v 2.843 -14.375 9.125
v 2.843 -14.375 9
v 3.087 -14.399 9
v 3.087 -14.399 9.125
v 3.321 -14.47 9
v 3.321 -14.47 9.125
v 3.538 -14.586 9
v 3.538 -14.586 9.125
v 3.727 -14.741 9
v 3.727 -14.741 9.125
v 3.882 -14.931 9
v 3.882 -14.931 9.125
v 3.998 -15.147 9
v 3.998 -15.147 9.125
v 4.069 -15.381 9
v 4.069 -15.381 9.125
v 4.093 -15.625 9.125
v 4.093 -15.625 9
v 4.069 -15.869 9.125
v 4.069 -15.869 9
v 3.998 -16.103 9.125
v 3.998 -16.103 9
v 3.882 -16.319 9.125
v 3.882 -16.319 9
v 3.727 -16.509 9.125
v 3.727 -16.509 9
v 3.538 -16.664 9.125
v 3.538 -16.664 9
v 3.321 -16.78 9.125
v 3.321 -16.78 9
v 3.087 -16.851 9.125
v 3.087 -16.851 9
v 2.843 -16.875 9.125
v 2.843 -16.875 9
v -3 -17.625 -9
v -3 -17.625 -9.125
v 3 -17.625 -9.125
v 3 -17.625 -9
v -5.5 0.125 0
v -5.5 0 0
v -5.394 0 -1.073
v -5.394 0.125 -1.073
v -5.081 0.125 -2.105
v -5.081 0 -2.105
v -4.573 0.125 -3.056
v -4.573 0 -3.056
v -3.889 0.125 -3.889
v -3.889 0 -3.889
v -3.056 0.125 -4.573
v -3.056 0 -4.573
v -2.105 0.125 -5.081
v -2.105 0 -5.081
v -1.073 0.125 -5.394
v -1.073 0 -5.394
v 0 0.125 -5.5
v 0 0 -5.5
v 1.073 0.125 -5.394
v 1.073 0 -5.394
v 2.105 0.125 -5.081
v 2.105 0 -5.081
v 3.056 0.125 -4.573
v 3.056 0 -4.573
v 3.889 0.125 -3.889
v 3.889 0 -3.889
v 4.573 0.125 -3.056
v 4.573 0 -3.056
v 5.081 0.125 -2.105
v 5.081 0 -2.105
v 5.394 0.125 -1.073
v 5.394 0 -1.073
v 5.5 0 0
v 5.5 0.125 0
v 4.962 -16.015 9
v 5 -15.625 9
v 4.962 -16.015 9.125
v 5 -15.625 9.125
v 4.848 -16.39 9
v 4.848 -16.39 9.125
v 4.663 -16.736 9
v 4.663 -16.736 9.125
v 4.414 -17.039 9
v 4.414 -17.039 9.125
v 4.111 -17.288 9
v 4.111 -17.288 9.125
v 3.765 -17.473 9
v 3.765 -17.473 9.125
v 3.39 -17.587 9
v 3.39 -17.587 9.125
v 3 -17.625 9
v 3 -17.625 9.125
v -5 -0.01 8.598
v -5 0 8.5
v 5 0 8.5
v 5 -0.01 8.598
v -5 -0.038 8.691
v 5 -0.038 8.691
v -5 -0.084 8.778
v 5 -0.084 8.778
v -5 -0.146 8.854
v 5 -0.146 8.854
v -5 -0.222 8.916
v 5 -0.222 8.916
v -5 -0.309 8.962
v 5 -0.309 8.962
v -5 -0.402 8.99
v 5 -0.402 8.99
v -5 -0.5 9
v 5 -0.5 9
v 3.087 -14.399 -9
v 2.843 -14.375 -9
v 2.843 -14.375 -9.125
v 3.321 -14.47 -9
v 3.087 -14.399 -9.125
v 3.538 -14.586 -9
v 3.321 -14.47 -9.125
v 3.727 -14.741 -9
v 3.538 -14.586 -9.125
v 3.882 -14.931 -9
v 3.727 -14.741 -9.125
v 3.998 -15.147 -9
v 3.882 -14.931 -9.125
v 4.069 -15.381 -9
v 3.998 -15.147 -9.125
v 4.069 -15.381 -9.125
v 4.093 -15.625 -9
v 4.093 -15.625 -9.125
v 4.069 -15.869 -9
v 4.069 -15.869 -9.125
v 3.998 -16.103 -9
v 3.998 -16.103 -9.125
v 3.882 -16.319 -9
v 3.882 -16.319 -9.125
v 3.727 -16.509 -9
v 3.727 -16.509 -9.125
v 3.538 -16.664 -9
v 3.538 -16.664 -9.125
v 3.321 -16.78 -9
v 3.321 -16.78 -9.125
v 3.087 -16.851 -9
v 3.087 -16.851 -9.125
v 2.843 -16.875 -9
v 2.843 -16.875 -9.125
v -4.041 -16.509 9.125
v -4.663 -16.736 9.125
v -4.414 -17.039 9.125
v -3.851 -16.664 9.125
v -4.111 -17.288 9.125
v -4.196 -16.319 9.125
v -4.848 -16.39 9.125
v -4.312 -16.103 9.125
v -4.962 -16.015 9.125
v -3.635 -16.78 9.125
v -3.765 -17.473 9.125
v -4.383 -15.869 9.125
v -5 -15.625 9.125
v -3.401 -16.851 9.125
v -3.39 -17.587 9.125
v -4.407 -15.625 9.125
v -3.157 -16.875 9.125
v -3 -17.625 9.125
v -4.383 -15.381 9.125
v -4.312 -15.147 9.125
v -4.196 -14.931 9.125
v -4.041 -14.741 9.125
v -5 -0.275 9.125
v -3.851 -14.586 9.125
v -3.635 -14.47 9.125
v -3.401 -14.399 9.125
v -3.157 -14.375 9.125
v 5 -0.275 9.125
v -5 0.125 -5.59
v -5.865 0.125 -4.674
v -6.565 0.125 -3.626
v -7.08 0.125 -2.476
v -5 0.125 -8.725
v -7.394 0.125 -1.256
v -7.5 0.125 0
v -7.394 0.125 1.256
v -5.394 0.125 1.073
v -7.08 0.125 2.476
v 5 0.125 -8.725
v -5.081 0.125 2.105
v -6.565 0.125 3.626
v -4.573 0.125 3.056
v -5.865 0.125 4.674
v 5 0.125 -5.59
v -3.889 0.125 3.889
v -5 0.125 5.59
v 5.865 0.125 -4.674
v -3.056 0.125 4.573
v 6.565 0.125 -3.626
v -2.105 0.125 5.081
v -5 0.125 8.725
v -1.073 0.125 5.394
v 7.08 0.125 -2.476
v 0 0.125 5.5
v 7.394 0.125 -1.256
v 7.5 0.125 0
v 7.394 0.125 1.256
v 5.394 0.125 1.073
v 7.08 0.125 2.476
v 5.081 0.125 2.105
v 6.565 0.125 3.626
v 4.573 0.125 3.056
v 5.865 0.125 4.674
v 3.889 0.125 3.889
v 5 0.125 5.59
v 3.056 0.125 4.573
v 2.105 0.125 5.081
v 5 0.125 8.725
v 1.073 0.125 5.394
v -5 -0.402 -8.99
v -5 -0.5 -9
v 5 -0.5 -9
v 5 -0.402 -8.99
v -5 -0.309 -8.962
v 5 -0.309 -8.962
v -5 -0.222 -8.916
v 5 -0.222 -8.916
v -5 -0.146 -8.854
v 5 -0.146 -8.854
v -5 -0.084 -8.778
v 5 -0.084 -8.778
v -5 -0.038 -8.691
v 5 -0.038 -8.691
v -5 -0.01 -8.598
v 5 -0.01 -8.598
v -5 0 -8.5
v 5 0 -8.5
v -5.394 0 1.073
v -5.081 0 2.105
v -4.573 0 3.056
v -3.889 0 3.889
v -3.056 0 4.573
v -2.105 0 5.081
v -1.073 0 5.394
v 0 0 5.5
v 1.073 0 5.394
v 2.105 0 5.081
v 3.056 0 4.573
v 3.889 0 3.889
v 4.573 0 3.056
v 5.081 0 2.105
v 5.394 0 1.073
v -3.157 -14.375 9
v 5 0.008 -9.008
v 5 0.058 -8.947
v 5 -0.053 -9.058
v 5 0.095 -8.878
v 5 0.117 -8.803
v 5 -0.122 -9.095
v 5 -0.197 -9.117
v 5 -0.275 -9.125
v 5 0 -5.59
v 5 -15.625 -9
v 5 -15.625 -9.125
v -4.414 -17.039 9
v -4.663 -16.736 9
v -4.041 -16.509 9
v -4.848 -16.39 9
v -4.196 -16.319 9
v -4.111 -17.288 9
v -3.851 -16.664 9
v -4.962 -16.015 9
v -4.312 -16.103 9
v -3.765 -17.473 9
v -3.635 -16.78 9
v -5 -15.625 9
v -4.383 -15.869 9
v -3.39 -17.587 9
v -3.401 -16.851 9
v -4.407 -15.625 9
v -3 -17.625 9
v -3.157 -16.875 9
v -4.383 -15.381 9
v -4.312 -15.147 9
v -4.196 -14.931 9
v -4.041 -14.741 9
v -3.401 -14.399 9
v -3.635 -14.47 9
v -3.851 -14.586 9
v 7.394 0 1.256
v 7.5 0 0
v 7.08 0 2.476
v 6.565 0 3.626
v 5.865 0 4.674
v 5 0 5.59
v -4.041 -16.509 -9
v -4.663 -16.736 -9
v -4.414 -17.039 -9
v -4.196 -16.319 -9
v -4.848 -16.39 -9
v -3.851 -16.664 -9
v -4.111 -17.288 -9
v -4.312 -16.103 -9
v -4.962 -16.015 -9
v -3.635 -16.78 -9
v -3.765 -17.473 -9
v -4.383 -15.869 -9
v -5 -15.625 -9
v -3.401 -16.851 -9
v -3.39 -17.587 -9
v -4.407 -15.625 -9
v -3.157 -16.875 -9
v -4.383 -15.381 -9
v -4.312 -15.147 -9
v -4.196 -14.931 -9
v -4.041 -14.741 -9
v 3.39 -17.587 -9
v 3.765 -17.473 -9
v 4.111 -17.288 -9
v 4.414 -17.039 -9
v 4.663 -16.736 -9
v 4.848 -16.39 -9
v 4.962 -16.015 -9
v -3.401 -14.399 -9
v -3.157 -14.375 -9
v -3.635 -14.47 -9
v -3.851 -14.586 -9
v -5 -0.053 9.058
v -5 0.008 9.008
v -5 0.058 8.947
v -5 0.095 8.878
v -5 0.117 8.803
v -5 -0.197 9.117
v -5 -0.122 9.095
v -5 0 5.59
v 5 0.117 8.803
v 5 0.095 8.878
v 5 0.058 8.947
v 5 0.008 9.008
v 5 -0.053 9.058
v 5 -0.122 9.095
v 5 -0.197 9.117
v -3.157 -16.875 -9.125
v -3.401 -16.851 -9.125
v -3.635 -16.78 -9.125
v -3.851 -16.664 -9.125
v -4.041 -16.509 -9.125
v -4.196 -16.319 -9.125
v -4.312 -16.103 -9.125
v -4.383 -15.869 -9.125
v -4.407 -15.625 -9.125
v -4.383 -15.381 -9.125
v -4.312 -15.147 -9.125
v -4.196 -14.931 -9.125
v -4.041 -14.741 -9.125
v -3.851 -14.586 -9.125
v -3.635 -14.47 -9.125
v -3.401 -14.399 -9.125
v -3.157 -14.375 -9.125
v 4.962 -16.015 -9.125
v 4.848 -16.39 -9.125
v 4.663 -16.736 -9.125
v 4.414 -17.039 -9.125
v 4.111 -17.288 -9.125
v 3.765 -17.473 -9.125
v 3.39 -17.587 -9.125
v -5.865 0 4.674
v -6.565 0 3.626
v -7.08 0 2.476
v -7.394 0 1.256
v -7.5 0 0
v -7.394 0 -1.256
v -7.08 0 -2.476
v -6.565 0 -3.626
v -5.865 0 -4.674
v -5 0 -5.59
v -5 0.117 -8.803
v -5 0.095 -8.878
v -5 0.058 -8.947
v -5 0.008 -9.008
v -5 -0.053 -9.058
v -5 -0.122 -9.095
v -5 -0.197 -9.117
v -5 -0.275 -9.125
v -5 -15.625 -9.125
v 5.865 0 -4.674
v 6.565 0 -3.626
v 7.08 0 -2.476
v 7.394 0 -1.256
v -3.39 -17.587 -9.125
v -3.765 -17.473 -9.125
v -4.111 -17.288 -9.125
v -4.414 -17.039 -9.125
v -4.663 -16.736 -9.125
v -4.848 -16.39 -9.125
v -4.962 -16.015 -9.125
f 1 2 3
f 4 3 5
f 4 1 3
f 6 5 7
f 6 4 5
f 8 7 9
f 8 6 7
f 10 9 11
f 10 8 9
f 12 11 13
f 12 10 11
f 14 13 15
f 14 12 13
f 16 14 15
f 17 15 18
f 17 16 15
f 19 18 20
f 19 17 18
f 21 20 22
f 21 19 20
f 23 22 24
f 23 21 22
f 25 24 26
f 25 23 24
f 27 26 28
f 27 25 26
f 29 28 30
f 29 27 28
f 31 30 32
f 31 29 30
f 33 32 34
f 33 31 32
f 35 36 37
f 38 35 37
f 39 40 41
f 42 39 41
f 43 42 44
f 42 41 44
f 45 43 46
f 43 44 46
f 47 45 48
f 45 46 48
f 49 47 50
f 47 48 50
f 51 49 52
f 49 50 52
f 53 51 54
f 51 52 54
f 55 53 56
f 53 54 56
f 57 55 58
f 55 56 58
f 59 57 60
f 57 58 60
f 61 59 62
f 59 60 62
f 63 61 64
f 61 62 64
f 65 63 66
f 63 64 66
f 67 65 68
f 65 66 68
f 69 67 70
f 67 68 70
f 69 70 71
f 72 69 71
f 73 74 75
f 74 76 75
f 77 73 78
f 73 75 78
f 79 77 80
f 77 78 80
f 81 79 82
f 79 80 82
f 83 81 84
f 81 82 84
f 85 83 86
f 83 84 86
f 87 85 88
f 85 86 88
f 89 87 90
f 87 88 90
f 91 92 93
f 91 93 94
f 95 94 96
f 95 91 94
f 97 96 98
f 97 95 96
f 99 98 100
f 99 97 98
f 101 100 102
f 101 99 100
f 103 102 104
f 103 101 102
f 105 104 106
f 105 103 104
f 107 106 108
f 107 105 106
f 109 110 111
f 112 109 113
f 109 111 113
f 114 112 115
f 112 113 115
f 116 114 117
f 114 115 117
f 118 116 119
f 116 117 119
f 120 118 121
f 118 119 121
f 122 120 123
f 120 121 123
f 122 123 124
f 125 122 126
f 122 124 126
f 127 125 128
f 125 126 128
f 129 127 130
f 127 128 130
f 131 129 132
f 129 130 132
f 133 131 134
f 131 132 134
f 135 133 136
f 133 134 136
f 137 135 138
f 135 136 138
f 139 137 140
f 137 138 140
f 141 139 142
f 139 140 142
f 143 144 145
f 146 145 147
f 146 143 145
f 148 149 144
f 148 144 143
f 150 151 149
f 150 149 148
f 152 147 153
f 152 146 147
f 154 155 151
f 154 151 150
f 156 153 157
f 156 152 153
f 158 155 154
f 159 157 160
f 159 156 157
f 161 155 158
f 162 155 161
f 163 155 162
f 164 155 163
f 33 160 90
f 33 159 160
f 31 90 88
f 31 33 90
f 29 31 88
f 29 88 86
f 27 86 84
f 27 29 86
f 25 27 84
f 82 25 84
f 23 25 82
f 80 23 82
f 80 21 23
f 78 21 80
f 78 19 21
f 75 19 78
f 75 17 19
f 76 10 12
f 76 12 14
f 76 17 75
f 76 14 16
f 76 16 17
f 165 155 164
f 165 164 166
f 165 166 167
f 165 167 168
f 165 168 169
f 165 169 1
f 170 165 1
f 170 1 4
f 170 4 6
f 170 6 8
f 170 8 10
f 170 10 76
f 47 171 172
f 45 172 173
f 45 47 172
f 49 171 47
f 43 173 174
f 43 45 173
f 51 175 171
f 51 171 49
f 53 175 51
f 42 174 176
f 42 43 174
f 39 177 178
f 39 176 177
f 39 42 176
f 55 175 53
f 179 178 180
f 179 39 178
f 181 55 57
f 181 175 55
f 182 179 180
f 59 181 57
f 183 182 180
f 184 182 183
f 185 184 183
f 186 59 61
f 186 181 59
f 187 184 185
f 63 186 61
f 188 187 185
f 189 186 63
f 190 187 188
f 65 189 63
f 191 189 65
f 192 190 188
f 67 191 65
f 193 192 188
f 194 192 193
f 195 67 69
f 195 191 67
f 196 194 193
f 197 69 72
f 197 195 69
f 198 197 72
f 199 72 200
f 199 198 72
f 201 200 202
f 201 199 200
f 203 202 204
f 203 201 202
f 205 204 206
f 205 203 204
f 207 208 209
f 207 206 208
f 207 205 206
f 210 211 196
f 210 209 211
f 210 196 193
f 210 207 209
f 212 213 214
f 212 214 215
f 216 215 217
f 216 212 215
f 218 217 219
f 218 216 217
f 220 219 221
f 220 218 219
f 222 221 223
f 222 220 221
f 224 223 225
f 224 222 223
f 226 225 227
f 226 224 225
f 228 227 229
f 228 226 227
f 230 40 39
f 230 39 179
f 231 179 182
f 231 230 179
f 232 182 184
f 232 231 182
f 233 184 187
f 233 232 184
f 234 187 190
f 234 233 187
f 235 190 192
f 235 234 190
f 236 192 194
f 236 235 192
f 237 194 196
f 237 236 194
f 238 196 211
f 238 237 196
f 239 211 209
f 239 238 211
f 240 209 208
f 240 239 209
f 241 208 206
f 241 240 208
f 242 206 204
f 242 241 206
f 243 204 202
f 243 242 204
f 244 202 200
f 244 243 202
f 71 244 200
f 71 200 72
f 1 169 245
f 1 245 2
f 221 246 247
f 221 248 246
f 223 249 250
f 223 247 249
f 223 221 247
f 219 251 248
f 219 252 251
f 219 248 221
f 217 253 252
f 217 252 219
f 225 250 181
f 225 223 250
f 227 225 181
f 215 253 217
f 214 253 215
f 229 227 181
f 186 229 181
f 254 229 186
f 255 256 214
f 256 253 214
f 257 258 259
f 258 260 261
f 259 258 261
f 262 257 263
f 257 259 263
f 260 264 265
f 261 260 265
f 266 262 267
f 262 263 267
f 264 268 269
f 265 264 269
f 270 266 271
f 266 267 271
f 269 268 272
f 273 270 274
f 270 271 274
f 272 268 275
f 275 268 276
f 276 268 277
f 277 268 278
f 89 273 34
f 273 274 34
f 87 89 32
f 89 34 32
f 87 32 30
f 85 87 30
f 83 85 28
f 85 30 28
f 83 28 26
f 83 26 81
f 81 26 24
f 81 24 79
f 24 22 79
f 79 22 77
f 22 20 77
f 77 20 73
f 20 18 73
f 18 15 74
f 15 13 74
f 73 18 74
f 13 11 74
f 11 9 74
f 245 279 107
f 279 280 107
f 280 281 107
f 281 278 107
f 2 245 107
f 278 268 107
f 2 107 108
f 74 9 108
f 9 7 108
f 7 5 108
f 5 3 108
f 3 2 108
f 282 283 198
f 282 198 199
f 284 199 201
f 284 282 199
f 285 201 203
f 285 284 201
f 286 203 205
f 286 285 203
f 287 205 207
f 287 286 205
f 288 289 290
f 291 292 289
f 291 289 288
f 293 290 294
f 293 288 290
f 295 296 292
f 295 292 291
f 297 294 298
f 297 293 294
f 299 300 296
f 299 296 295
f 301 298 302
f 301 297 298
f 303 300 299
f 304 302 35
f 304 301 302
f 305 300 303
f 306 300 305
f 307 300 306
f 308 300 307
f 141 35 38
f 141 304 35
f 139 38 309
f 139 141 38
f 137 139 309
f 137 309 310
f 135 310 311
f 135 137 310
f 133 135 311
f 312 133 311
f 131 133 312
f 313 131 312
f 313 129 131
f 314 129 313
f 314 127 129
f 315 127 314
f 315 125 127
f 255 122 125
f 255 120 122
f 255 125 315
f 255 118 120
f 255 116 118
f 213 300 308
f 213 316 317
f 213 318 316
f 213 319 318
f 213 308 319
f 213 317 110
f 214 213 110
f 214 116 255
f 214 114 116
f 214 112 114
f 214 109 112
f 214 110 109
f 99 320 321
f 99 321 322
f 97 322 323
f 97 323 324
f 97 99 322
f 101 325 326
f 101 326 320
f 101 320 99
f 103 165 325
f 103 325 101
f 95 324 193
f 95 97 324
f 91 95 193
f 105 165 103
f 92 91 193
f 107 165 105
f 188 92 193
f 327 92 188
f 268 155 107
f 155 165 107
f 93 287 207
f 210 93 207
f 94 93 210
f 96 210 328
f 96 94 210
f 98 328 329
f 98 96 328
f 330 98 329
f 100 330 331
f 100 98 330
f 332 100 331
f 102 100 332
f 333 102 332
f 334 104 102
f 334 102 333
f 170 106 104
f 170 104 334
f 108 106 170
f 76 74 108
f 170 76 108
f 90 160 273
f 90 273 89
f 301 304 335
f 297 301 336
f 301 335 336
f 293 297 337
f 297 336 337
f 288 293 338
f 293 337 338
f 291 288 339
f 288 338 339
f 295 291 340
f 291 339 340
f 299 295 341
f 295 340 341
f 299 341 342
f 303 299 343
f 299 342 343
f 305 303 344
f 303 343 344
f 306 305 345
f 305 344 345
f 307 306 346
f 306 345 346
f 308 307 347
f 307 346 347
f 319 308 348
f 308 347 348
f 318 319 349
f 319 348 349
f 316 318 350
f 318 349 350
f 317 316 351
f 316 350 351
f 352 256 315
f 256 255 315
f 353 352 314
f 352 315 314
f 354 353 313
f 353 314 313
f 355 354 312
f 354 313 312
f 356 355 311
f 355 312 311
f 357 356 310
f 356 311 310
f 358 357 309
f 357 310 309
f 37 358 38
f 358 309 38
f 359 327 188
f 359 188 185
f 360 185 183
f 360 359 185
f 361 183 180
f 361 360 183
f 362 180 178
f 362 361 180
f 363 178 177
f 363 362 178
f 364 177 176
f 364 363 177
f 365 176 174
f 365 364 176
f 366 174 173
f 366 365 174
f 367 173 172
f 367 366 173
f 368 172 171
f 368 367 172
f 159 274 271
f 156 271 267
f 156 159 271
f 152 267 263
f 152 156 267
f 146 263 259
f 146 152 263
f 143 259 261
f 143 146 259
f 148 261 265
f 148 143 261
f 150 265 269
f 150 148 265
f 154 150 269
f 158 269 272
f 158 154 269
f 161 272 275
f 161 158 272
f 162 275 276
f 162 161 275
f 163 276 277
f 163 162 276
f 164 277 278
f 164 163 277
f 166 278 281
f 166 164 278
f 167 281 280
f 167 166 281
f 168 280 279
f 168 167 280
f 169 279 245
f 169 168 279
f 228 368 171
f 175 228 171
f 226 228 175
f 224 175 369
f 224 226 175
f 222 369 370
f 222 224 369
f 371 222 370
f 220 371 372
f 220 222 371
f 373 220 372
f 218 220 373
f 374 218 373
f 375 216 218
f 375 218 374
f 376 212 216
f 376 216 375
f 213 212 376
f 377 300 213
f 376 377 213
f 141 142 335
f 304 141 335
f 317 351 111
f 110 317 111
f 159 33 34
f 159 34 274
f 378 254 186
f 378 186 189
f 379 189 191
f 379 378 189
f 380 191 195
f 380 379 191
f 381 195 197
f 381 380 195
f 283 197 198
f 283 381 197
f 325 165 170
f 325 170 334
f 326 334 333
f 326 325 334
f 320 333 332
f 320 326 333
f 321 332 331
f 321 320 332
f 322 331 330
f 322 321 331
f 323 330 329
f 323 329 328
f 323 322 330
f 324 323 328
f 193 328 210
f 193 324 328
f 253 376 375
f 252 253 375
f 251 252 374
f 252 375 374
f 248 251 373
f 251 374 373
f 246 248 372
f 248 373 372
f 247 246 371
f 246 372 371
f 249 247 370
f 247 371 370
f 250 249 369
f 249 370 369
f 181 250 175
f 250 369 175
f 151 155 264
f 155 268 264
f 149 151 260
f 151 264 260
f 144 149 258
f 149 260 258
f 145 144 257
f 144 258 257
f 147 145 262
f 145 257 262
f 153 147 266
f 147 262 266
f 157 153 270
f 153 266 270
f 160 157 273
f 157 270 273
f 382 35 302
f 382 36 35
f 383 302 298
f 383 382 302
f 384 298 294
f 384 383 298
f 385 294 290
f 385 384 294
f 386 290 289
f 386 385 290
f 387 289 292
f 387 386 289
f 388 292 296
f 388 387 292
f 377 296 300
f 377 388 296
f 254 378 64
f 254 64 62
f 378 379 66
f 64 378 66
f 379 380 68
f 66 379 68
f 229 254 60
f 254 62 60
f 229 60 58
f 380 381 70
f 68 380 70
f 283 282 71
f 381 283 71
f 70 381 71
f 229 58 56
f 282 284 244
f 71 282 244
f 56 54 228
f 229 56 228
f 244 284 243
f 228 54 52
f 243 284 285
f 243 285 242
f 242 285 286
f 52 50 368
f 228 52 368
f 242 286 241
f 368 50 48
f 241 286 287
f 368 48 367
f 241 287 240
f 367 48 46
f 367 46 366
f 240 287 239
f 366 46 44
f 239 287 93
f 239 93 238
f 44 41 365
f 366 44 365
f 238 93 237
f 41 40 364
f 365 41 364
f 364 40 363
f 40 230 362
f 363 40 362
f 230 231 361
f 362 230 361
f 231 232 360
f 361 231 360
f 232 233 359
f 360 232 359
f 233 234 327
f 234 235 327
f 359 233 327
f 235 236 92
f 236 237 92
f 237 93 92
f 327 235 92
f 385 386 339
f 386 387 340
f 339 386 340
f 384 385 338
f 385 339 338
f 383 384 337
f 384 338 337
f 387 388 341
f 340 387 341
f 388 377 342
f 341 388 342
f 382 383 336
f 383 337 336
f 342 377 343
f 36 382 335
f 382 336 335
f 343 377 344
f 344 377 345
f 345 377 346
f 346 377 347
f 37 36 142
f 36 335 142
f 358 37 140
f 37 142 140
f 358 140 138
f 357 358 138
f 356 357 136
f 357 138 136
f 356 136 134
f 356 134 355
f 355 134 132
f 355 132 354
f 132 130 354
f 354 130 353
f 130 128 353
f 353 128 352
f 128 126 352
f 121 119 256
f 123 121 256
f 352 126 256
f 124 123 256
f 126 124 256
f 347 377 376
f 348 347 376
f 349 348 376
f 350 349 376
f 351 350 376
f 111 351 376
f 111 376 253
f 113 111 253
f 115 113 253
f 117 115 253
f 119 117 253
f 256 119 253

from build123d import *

# Parameters (mm, degrees)
BOSS_EXTRUDE1_DEPTH = 0.125
SKETCH3_W           = 0.125
SKETCH3_H           = 15.25
BOSS_EXTRUDE2_DEPTH = 15.766908
SKETCH4_W           = 15.766907998
SKETCH4_H           = 0.125
BOSS_EXTRUDE3_DEPTH = 2.5
CUT_EXTRUDE1_DEPTH  = 2.5
FILLET1_R           = 0.4
FILLET2_R           = 0.5
FILLET3_R           = 0.5
FILLET4_R           = 2
FILLET5_R           = 2
FILLET6_R           = 0.4
CUT_EXTRUDE2_START  = -17.75
CUT_EXTRUDE2_DEPTH  = 17.75
FILLET7_R           = 2


with BuildPart() as part:
    # Sketch2 → Boss-Extrude1 (new body)
    with BuildSketch(Plane(origin=(0, 0, 0), x_dir=(1, 0, 0), z_dir=(0, 1, 0))):
        with BuildLine():
            Line((-7.883453999, 0), (-5.5, 0))
            ThreePointArc((-5.5, 0), (0, -5.5), (5.5, 0))
            Line((5.5, 0), (7.883453999, 0))
            Line((7.883453999, 0), (7.883453999, -9))
            Line((7.883453999, -9), (-7.883453999, -9))
            Line((-7.883453999, -9), (-7.883453999, 0))
        make_face()
    extrude(amount=BOSS_EXTRUDE1_DEPTH)

    # Sketch3 → Boss-Extrude2 (add)
    with BuildSketch(Plane(origin=(7.883453999, 0, 0), x_dir=(0, 0, -1), z_dir=(1, 0, 0))):
        with Locations((-9.0625, -7.5)):
            Rectangle(SKETCH3_W, SKETCH3_H)
    extrude(amount=-BOSS_EXTRUDE2_DEPTH)

    # Sketch4 → Boss-Extrude3 (add)
    with BuildSketch(Plane.XZ.offset(15.125)):
        with Locations((0, 9.0625)):
            Rectangle(SKETCH4_W, SKETCH4_H)
    extrude(amount=BOSS_EXTRUDE3_DEPTH)

    # Sketch5 → Cut-Extrude1 (cut)
    with BuildSketch(Plane.XY.offset(9.125)):
        with BuildLine():
            Line((-3.156922186, -14.375), (2.843077814, -14.375))
            ThreePointArc((2.843077814, -14.375), (4.093077814, -15.625), (2.843077814, -16.875))
            Line((2.843077814, -16.875), (-3.156922186, -16.875))
            ThreePointArc((-3.156922186, -16.875), (-4.406922186, -15.625), (-3.156922186, -14.375))
        make_face()
    extrude(amount=-CUT_EXTRUDE1_DEPTH, mode=Mode.SUBTRACT)

    # Mirror1: part across plane


with BuildPart() as part_1:
    add(part.part)
    add(part.part.mirror(Plane(origin=(5.5, 0.125, 0), x_dir=(1, 0, 0), z_dir=(0, 0, 1))))

    # Fillet1
    fillet1_edges = [part_1.edges().sort_by_distance(p)[0] for p in [
        (-1e-09, 0.125, 9.125),
    ]]
    fillet(fillet1_edges, radius=FILLET1_R)

    # Fillet2
    fillet2_edges = [part_1.edges().sort_by_distance(p)[0] for p in [
        (0, 0, 9),
    ]]
    fillet(fillet2_edges, radius=FILLET2_R)

    # Fillet3
    fillet3_edges = [part_1.edges().sort_by_distance(p)[0] for p in [
        (0, 0, -9),
    ]]
    fillet(fillet3_edges, radius=FILLET3_R)

    # Fillet4
    fillet4_edges = [part_1.edges().sort_by_distance(p)[0] for p in [
        (7.883453999, -17.625, 9.0625),
        (-7.883453999, -17.625, 9.0625),
    ]]
    fillet(fillet4_edges, radius=FILLET4_R)

    # Fillet5
    fillet5_edges = [part_1.edges().sort_by_distance(p)[0] for p in [
        (7.883453999, -17.625, -9.0625),
        (-7.883453999, -17.625, -9.0625),
    ]]
    fillet(fillet5_edges, radius=FILLET5_R)

    # Fillet6
    fillet6_edges = [part_1.edges().sort_by_distance(p)[0] for p in [
        (-1e-09, 0.125, -9.125),
    ]]
    fillet(fillet6_edges, radius=FILLET6_R)

    # Sketch6 → Cut-Extrude2 (cut)
    with BuildSketch(Plane(origin=(0, 0.125, 0), x_dir=(1, 0, 0), z_dir=(0, 1, 0)).offset(CUT_EXTRUDE2_START)):
        Polygon((7.883453999, -8.725), (5, -8.725), (5, -13.174899539), (11.0971106, -13.174899539), (11.0971106, 15.116605335), (5, 15.116605335), (5, 8.725), (7.883453999, 8.725), align=None)
        Polygon((-5, -13.174899539), (-5, -8.725), (-7.883453999, -8.725), (-7.883453999, 8.725), (-5, 8.725), (-5, 15.116605335), (-11.0971106, 15.116605335), (-11.0971106, -13.174899539), align=None)
        with BuildLine():
            Line((5, -5.590169944), (5, -8.725))
            Line((5, -8.725), (7.883453999, -8.725))
            Line((7.883453999, -8.725), (7.883453999, 8.725))
            Line((7.883453999, 8.725), (5, 8.725))
            Line((5, 8.725), (5, 5.590169944))
            ThreePointArc((5, 5.590169944), (6.846531969, 3.061862178), (7.5, 0))
            ThreePointArc((7.5, 0), (6.846531969, -3.061862178), (5, -5.590169944))
        make_face()
        with BuildLine():
            Line((-7.883453999, -8.725), (-5, -8.725))
            Line((-5, -8.725), (-5, -5.590169944))
            ThreePointArc((-5, -5.590169944), (-7.5, 0), (-5, 5.590169944))
            Line((-5, 5.590169944), (-5, 8.725))
            Line((-5, 8.725), (-7.883453999, 8.725))
            Line((-7.883453999, 8.725), (-7.883453999, -8.725))
        make_face()
    extrude(amount=CUT_EXTRUDE2_DEPTH, mode=Mode.SUBTRACT)

    # Fillet7
    fillet7_edges = [part_1.edges().sort_by_distance(p)[0] for p in [
        (5, -17.625, 9.0625),
        (5, -17.625, -9.0625),
        (-5, -17.625, 9.0625),
        (-5, -17.625, -9.0625),
    ]]
    fillet(fillet7_edges, radius=FILLET7_R)


solid = part_1.part
